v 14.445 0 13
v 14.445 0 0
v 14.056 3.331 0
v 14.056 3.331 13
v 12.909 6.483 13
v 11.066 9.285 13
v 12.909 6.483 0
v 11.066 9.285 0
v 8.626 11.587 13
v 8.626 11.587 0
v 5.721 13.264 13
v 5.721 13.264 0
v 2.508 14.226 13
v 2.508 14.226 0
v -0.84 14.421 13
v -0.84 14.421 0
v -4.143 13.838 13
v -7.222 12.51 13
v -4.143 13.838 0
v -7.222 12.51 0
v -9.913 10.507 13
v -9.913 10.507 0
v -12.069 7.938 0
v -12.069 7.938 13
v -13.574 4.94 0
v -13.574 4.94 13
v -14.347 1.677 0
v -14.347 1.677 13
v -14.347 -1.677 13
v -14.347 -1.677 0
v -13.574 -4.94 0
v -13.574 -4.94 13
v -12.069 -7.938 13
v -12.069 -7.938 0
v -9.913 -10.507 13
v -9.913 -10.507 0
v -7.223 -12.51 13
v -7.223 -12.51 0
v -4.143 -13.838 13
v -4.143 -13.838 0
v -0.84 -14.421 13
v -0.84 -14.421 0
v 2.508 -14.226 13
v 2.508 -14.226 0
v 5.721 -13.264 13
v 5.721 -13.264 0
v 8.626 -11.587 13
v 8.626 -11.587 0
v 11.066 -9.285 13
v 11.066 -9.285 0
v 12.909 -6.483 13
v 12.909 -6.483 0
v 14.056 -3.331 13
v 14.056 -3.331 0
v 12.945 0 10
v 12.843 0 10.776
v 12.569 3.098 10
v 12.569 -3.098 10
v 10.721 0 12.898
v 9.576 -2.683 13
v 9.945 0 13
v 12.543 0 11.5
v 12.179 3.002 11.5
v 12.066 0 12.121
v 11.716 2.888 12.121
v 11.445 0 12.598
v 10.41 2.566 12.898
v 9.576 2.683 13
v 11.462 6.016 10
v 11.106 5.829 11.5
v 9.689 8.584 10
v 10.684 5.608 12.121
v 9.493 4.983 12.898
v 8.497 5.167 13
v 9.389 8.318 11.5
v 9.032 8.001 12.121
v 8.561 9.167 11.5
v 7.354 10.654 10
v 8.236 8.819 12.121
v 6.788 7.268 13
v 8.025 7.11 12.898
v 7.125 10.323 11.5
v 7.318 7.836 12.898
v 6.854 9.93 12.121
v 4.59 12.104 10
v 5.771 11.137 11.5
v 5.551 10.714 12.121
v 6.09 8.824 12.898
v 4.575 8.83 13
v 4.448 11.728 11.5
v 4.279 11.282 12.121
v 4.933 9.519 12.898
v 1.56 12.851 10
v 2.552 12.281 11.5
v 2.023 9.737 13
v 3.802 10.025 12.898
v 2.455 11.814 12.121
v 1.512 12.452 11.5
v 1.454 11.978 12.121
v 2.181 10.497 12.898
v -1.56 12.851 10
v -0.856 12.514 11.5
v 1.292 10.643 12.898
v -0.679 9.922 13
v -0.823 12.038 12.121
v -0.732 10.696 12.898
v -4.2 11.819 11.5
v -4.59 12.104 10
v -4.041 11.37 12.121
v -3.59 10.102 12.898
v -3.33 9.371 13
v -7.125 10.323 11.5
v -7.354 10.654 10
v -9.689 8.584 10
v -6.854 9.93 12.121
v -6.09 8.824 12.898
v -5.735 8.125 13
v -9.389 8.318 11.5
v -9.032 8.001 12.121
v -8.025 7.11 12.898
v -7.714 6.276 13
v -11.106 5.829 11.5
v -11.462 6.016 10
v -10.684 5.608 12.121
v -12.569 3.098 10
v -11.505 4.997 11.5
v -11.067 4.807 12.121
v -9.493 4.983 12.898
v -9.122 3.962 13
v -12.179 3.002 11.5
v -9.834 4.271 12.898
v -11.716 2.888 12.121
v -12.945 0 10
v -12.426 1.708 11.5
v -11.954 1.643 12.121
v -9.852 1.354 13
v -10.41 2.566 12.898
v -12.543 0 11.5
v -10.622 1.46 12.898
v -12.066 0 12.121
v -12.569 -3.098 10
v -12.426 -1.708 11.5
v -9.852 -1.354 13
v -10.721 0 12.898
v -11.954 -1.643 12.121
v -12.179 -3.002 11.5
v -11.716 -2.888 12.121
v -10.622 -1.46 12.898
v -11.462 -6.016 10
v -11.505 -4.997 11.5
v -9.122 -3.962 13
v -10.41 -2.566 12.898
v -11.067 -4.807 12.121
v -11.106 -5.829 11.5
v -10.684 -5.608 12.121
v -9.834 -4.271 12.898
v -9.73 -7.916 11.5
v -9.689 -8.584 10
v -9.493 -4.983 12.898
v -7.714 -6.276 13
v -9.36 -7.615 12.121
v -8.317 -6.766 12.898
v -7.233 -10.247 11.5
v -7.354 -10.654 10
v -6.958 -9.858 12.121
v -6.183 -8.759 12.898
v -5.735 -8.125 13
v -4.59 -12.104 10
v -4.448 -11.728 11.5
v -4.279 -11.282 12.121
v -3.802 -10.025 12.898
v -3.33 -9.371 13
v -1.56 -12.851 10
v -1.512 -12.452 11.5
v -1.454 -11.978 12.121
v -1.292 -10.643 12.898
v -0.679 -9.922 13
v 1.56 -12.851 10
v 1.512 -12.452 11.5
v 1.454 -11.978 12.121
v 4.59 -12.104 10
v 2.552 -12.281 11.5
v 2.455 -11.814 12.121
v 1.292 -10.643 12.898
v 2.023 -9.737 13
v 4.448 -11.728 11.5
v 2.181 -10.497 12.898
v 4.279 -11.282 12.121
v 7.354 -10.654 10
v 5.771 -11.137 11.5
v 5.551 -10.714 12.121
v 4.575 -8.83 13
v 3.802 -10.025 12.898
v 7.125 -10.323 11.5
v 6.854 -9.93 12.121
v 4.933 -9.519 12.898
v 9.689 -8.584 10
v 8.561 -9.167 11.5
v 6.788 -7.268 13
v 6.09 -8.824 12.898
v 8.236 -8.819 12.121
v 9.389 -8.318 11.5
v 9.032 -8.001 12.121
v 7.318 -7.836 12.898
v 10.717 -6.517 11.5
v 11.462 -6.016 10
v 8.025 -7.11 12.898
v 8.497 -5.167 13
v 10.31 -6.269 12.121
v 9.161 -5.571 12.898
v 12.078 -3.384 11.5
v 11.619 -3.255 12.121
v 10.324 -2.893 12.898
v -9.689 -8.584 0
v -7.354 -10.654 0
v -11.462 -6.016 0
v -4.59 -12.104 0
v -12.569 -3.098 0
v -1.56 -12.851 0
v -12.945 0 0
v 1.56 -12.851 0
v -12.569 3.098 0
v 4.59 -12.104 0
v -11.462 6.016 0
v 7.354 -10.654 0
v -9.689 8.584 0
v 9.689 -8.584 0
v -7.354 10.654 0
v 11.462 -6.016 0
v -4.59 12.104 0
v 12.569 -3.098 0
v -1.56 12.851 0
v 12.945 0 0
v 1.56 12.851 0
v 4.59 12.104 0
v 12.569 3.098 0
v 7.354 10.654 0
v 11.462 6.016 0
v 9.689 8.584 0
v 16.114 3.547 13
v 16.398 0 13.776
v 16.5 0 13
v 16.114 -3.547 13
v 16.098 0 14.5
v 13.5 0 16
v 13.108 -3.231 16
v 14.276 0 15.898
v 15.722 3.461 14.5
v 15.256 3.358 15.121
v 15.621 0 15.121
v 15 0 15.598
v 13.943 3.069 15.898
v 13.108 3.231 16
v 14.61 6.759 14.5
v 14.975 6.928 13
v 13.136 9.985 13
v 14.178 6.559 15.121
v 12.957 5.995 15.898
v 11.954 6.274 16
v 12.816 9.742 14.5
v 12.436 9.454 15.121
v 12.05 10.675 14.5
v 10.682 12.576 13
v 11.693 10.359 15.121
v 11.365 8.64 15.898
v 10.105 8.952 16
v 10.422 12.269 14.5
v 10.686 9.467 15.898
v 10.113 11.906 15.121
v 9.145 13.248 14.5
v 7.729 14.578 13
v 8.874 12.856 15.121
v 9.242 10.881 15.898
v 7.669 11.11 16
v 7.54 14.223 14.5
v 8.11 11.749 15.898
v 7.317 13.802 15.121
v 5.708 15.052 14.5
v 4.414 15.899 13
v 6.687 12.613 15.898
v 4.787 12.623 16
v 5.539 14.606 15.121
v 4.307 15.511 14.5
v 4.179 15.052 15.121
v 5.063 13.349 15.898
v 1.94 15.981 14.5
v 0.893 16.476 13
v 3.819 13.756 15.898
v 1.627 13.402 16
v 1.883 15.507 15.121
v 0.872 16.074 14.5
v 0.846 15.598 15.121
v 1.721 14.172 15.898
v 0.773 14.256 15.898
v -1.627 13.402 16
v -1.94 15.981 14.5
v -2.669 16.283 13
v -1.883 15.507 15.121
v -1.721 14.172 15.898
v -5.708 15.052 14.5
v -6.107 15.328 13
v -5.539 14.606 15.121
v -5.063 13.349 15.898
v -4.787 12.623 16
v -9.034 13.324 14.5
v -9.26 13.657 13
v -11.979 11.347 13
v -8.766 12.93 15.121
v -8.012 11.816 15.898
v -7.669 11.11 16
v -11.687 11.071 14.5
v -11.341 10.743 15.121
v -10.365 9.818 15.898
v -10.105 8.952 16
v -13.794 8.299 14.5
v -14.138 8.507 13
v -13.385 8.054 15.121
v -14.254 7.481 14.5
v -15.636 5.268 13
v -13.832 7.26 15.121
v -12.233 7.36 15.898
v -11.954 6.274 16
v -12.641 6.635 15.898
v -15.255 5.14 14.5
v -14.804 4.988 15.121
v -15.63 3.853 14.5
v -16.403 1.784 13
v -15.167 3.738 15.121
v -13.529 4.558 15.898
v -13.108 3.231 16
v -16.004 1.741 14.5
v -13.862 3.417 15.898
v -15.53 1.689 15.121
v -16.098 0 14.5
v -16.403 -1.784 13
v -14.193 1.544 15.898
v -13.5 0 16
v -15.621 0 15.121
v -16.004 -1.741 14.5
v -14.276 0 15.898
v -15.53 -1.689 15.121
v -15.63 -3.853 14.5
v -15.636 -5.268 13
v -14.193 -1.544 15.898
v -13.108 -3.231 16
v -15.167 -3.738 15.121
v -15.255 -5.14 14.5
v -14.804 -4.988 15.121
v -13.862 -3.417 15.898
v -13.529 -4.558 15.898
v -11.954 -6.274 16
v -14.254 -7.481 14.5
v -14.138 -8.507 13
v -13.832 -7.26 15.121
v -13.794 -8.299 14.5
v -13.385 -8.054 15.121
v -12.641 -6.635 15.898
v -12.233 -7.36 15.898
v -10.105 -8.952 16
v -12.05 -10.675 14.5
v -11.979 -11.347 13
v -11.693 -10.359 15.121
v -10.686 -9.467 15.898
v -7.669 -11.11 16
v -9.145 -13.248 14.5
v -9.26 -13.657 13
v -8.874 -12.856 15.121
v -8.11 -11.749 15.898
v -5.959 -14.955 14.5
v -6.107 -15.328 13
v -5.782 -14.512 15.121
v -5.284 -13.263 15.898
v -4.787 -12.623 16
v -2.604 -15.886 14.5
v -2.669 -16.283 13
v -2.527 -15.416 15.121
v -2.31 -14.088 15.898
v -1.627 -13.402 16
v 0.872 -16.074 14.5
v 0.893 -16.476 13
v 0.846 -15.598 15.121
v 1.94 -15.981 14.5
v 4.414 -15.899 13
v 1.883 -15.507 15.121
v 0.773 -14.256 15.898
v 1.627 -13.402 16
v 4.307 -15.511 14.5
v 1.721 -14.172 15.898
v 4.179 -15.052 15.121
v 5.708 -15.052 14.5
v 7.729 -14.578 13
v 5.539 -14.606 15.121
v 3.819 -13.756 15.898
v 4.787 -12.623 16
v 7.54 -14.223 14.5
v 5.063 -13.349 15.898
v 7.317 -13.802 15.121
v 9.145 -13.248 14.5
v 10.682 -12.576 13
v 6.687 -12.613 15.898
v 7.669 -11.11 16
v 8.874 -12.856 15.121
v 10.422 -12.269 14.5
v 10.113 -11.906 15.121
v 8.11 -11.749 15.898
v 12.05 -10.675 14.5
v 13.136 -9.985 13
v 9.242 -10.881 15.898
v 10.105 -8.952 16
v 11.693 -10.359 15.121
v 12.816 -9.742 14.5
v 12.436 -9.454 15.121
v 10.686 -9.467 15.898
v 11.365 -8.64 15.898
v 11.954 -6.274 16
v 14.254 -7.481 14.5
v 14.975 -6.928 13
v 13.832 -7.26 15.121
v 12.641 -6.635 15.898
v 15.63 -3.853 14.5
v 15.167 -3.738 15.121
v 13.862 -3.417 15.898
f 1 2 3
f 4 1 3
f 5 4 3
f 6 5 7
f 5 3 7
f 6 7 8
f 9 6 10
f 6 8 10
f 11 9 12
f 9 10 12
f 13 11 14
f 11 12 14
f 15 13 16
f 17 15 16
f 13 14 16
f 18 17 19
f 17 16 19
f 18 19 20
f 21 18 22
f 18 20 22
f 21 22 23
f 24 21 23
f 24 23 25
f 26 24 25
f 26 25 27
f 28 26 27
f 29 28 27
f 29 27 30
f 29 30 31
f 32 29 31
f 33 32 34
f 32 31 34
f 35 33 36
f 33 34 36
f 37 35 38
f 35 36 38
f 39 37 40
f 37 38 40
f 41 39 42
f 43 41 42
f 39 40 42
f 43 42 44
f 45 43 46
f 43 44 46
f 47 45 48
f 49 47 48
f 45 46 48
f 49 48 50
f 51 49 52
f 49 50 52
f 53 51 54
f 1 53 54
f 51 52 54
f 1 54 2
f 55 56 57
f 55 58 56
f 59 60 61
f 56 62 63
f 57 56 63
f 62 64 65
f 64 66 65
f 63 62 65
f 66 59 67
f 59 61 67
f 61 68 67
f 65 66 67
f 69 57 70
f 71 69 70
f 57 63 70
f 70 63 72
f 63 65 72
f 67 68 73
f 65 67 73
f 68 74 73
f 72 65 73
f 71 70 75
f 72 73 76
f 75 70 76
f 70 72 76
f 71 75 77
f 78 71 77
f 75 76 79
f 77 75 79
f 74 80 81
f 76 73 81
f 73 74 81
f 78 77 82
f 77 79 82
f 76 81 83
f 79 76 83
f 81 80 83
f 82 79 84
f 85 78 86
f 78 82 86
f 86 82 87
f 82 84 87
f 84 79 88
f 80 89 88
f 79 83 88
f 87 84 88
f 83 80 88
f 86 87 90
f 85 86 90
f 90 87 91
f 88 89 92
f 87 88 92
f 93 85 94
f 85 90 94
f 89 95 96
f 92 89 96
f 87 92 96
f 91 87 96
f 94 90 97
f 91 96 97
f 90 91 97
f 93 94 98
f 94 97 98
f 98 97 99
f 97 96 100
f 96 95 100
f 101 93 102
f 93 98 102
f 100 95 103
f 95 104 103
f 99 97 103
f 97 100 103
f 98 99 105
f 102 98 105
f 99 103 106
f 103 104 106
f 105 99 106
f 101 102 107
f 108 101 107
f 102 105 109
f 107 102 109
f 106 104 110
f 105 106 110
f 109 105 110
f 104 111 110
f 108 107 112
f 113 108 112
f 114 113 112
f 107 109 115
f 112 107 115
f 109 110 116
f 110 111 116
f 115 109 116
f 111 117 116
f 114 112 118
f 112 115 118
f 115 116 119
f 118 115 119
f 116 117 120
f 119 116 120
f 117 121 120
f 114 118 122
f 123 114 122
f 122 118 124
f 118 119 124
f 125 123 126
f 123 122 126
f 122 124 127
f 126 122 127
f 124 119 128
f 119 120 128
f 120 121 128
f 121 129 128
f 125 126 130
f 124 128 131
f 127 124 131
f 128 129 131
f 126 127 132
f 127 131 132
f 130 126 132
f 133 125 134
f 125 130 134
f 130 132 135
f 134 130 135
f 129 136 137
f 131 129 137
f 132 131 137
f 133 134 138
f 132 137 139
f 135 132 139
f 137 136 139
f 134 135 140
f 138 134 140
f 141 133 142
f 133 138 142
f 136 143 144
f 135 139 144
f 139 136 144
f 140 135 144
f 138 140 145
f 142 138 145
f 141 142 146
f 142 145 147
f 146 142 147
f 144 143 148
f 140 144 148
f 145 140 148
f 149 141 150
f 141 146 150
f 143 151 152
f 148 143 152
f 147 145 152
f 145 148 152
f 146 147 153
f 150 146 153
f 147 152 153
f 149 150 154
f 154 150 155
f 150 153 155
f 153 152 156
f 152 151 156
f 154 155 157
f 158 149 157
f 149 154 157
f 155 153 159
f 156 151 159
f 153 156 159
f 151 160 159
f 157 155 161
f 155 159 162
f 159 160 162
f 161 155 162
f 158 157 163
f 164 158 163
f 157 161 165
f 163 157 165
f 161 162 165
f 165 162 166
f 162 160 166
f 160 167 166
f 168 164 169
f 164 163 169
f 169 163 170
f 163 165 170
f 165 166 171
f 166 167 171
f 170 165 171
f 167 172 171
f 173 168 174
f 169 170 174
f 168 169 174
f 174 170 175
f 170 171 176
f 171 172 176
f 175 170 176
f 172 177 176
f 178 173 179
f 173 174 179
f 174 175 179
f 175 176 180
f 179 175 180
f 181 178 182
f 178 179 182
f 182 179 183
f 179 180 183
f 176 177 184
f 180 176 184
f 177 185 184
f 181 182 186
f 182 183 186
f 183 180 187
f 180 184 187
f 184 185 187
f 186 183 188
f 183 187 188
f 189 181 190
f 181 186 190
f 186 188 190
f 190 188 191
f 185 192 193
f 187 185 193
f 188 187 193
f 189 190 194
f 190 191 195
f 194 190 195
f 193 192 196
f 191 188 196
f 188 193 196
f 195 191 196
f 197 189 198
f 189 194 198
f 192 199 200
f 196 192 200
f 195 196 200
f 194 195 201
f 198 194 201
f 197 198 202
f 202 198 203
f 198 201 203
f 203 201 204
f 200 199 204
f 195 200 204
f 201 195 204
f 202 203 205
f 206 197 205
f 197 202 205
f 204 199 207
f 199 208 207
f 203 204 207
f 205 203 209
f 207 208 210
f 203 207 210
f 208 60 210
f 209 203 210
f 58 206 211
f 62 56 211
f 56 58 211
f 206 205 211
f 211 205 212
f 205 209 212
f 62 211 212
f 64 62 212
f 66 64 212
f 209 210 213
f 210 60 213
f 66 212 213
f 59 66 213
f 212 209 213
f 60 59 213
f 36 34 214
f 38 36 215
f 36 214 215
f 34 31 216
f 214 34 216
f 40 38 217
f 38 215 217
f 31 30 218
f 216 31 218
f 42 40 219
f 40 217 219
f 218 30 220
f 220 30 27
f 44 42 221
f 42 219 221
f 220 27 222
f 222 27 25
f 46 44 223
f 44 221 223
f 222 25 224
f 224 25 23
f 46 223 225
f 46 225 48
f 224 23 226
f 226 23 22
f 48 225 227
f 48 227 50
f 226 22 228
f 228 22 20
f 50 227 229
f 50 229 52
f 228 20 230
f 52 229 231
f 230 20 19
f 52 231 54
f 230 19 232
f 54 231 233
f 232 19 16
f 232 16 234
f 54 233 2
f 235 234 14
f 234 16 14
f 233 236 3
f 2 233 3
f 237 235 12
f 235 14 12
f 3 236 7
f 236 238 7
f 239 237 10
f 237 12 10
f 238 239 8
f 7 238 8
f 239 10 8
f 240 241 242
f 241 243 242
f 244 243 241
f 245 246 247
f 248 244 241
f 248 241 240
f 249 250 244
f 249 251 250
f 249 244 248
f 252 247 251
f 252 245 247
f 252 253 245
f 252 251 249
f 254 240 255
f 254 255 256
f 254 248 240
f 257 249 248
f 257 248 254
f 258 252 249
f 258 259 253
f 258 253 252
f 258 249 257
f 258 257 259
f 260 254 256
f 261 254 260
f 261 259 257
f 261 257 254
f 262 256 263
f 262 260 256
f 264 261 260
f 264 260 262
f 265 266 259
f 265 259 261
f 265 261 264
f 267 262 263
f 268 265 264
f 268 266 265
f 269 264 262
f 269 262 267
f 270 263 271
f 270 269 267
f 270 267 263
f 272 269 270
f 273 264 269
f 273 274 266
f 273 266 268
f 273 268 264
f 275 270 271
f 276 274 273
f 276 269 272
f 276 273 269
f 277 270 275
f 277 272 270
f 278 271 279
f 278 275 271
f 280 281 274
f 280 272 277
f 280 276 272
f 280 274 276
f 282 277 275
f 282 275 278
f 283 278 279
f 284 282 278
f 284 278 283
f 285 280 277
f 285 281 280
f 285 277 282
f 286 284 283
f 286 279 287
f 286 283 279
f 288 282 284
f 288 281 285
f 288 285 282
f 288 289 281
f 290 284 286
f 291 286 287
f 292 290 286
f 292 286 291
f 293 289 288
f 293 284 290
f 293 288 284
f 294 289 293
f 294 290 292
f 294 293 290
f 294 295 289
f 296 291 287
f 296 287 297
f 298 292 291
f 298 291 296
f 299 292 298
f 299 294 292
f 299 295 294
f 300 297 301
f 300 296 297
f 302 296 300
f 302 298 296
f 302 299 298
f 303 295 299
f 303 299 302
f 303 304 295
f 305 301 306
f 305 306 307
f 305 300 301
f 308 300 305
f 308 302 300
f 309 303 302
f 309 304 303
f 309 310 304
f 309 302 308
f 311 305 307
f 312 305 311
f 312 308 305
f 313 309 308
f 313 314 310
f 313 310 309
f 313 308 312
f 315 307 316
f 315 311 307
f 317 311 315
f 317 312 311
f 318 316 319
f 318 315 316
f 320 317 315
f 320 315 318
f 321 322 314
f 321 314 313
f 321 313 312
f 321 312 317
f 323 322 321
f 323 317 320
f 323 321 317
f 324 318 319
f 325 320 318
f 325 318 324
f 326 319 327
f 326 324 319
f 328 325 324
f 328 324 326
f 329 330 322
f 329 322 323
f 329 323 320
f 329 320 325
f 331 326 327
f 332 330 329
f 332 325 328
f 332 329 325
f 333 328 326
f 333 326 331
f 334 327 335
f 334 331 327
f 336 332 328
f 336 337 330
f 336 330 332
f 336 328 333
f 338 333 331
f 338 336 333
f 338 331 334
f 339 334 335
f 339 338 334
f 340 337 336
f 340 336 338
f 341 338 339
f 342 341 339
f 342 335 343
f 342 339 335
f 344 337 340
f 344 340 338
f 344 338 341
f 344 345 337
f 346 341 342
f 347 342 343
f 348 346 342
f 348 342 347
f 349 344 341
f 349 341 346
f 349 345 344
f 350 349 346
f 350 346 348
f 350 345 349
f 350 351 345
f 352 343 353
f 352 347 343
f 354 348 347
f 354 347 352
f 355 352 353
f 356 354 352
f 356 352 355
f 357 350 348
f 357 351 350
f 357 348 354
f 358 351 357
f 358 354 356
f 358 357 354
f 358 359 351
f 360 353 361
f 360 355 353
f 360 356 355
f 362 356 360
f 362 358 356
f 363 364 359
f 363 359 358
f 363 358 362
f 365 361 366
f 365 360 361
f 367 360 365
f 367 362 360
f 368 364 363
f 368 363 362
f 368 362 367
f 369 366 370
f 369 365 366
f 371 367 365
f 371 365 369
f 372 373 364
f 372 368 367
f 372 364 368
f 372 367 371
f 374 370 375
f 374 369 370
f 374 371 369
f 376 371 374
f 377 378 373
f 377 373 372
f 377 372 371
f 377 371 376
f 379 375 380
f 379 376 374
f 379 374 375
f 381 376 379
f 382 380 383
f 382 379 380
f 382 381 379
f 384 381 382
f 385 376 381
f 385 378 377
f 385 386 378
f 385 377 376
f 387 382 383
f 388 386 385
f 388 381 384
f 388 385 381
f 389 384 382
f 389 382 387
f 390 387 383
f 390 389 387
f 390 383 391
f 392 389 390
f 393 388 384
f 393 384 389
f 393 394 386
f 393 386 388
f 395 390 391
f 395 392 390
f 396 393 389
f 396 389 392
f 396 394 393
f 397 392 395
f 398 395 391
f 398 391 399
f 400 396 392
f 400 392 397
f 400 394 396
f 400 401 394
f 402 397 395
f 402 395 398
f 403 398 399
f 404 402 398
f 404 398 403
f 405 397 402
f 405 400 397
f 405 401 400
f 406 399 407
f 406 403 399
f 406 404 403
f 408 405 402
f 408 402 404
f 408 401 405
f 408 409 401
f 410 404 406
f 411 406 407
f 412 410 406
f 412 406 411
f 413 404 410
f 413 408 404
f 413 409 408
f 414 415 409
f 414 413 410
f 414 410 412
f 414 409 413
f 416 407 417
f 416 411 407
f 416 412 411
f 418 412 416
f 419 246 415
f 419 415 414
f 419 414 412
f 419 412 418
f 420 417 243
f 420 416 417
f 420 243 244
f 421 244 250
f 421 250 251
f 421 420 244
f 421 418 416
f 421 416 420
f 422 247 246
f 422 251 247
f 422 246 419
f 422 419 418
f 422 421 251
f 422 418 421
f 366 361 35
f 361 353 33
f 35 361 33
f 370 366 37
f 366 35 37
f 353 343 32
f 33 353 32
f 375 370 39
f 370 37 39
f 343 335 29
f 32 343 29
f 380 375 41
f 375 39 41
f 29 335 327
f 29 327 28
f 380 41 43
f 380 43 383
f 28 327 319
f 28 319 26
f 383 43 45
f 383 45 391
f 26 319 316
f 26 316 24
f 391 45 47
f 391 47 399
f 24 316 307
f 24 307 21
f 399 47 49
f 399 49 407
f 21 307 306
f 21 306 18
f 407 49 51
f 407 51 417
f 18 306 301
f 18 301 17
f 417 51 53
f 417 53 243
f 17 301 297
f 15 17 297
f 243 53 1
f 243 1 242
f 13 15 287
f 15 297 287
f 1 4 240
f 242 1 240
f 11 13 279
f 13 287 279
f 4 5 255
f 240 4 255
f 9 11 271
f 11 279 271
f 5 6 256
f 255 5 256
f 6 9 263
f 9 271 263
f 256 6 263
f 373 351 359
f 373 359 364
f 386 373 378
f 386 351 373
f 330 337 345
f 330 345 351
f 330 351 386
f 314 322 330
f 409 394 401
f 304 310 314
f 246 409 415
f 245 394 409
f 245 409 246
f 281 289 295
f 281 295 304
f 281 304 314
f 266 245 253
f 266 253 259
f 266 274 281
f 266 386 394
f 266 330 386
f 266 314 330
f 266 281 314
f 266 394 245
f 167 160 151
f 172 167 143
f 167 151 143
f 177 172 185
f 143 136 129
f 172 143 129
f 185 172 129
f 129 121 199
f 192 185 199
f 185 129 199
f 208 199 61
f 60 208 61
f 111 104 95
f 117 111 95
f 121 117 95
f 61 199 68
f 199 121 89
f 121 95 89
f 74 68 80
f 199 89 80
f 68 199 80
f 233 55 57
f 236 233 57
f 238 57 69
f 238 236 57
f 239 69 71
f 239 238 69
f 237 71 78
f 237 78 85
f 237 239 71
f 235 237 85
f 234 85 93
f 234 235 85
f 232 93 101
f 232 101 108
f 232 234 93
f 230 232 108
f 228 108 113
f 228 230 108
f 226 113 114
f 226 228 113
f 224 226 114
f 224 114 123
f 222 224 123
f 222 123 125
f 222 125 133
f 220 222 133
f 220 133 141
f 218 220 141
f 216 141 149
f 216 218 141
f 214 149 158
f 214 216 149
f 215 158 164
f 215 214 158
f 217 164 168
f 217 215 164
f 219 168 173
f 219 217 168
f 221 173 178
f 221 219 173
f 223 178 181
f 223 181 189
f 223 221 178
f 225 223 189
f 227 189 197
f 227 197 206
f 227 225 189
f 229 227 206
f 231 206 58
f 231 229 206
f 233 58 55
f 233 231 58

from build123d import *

# Parameters (mm, degrees)
F0_R     = 14.445
F0_R_2   = 12.945
F1_DEPTH = 13
F2_R     = 16.5
F3_DEPTH = 3
F4_R     = 2.99999


# Not quite as in the source:
# - a fillet or chamfer is up to 0.001 mm smaller than in the source, because OpenCascade refuses the exact size


with BuildPart() as f1:
    # F0 (on Top) → F1 (new body)
    with BuildSketch(Plane.XY):
        Circle(F0_R)
        Circle(F0_R_2, mode=Mode.SUBTRACT)
    extrude(amount=F1_DEPTH)

    # F2 (on face) → F3 (join)
    with BuildSketch(Plane.XY.offset(13)):
        Circle(F2_R)
    extrude(amount=F3_DEPTH)

    # F4 (radius 3 in the source; OpenCascade refuses exactly that, so slightly less here)
    f4_edges = [f1.edges().sort_by_distance(p)[0] for p in [
        (-16.5, 0, 16),
        (-12.945, 0, 13),
    ]]
    fillet(f4_edges, radius=F4_R)


solid = f1.part
